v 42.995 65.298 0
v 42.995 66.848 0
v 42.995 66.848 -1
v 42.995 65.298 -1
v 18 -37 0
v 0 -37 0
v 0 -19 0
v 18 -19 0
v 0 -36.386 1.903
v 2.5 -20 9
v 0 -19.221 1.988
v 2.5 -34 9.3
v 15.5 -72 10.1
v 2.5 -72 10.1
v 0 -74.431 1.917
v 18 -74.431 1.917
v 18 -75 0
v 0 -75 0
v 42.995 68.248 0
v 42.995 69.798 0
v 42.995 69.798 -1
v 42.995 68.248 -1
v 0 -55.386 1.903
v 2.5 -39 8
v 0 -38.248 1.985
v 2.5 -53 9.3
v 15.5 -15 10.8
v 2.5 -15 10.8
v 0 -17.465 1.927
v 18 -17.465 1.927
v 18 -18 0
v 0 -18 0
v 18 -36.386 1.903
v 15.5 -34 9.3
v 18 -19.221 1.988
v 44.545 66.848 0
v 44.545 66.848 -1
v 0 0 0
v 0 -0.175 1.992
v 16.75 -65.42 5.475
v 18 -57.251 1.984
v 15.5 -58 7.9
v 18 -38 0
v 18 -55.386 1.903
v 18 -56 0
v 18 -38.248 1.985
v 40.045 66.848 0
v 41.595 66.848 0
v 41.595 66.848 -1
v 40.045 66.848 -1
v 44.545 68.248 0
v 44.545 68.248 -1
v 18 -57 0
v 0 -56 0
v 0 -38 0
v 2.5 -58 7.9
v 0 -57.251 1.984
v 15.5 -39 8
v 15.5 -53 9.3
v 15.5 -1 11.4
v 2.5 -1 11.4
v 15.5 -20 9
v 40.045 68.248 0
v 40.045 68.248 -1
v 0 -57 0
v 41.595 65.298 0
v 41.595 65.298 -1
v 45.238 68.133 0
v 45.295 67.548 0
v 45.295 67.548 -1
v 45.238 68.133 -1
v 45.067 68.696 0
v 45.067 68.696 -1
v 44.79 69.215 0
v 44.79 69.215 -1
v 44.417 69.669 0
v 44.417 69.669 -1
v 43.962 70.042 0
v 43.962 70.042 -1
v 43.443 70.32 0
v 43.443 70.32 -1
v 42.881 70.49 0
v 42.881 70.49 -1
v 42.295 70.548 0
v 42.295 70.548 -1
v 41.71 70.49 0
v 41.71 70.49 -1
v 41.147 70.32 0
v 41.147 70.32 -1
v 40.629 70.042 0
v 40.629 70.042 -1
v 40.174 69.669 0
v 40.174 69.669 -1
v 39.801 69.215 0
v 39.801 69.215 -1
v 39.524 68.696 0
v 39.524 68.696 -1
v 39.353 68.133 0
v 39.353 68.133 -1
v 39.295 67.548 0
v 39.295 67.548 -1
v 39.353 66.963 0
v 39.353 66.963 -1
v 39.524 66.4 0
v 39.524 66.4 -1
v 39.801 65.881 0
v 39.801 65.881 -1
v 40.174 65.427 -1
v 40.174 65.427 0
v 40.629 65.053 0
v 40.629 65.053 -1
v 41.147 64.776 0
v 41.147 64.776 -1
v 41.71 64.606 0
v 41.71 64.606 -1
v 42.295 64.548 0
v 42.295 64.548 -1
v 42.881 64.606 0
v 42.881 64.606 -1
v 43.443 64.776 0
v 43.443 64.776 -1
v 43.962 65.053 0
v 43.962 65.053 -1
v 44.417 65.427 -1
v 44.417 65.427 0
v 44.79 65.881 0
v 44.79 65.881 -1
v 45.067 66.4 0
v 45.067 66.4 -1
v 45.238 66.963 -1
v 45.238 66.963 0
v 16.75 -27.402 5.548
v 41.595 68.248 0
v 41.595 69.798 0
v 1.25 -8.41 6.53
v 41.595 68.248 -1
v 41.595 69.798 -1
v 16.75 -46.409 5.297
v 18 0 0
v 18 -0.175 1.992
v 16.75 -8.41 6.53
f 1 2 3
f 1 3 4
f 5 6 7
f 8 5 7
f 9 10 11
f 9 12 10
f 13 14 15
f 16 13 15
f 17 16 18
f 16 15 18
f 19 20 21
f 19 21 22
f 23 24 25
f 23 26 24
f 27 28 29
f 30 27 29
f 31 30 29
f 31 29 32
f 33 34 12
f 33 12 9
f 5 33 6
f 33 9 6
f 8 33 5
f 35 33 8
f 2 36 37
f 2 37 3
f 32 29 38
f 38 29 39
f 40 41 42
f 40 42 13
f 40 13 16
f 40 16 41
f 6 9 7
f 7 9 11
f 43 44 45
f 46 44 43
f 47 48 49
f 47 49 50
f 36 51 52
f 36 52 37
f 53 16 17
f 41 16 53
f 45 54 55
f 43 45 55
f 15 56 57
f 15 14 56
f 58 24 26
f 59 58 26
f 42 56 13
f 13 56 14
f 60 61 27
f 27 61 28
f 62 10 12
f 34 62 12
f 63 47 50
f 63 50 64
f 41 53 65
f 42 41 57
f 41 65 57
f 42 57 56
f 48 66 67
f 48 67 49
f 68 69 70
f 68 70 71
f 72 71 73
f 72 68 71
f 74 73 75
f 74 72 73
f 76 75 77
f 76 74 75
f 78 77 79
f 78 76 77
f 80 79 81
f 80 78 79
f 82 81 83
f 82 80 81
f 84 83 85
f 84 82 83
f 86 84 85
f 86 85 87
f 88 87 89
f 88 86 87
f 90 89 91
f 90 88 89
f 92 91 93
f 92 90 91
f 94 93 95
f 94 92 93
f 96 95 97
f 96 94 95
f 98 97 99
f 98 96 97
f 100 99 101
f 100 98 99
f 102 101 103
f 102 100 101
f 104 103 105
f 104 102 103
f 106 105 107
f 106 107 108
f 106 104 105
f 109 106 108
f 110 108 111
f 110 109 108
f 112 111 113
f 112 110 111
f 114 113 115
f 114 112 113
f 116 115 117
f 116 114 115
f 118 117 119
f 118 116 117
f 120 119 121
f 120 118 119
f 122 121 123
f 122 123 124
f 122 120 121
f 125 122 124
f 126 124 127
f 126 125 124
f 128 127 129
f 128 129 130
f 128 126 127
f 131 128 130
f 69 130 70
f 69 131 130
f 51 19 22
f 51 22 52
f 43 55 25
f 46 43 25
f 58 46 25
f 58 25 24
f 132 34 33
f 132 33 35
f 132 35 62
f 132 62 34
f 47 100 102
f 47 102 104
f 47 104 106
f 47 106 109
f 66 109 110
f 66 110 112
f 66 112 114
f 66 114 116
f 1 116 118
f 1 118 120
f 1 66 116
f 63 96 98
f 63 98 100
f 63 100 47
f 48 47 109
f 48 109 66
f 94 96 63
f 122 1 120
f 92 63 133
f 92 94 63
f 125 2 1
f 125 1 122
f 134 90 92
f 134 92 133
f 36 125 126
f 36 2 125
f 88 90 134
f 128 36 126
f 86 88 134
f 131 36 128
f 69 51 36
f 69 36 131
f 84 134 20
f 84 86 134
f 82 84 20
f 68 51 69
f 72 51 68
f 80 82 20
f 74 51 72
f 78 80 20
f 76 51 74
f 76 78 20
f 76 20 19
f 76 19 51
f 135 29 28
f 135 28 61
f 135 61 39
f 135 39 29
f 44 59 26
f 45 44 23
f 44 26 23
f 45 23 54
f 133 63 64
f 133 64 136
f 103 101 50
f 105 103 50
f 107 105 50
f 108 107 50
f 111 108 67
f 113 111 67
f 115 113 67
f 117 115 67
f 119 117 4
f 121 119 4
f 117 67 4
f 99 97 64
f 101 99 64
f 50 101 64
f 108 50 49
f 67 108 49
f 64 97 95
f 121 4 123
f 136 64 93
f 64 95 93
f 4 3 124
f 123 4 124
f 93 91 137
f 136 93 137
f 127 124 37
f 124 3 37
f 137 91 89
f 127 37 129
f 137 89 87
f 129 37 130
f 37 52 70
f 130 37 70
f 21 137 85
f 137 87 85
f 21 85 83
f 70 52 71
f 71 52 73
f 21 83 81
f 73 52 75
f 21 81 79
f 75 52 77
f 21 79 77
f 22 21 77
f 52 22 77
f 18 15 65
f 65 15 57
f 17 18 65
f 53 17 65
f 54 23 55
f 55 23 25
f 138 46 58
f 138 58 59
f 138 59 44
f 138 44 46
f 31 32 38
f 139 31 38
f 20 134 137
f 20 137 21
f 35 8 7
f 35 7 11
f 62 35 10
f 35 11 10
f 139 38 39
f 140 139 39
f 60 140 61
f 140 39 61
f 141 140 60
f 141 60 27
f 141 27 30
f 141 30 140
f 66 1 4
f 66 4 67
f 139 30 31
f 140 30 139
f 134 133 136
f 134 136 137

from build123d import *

# Parameters (mm, degrees)
F1_DEPTH  = 18
F18_R     = 3
F19_DEPTH = 1


with BuildPart() as f1:
    # F0 (on Right) → F1 (new body)
    with BuildSketch(Plane.YZ):
        Polygon((-18, 0), (0, 0), (-1, 11.4), (-15, 10.8), align=None)
    extrude(amount=F1_DEPTH)

    # F15 (on face) → F16 section 0
    with BuildSketch(Plane(origin=(0, -16.7106017192, 4.6418338109), x_dir=(1, 0, 0), z_dir=(0, -0.9635179096, 0.2676438638))):
        Polygon((0, -2.8175895481), (2.5, 6.3913354672), (0, 6.3913354672), align=None)
    # F14 (on face) → F16 section 1
    with BuildSketch(Plane(origin=(0, 0, 0), x_dir=(-1, 0, 0), z_dir=(0, 0.9961747239, 0.0873837477))):
        Polygon((0, 11.4437756007), (-2.5, 11.4437756007), (0, 2), align=None)
    loft(mode=Mode.SUBTRACT)

    # F14 (on face) → F17 section 0
    with BuildSketch(Plane(origin=(0, 0, 0), x_dir=(-1, 0, 0), z_dir=(0, 0.9961747239, 0.0873837477))):
        Polygon((-18, 11.4437756007), (-18, 2), (-15.5, 11.4437756007), align=None)
    # F15 (on face) → F17 section 1
    with BuildSketch(Plane(origin=(0, -16.7106017192, 4.6418338109), x_dir=(1, 0, 0), z_dir=(0, -0.9635179096, 0.2676438638))):
        Polygon((15.5, 6.3913354672), (18, -2.8175895481), (18, 6.3913354672), align=None)
    loft(mode=Mode.SUBTRACT)


with BuildPart() as f1b:
    # F0 (on Right) → F1, piece 2 (new body)
    with BuildSketch(Plane.YZ):
        Polygon((-37, 0), (-19, 0), (-20, 9), (-34, 9.3), align=None)
    extrude(amount=F1_DEPTH)

    # F11 (on face) → F12 section 0
    with BuildSketch(Plane(origin=(0, -33.5127238454, 10.8105560792), x_dir=(1, 0, 0), z_dir=(0, -0.9517086178, 0.3070027799))):
        Polygon((15.5, -1.5872043722), (18, -9.3591028571), (18, -1.5872043722), align=None)
    # F10 (on face) → F12 section 1
    with BuildSketch(Plane(origin=(0, -18.7682926829, -2.0853658537), x_dir=(-1, 0, 0), z_dir=(0, 0.9938837347, 0.1104315261))):
        Polygon((-18, 11.1535841336), (-18, 4.0981989954), (-15.5, 11.1535841336), align=None)
    loft(mode=Mode.SUBTRACT)

    # F10 (on face) → F13 section 0
    with BuildSketch(Plane(origin=(0, -18.7682926829, -2.0853658537), x_dir=(-1, 0, 0), z_dir=(0, 0.9938837347, 0.1104315261))):
        Polygon((0, 11.1535841336), (-2.5, 11.1535841336), (0, 4.0981989954), align=None)
    # F11 (on face) → F13 section 1
    with BuildSketch(Plane(origin=(0, -33.5127238454, 10.8105560792), x_dir=(1, 0, 0), z_dir=(0, -0.9517086178, 0.3070027799))):
        Polygon((0, -9.3591028571), (2.5, -1.5872043722), (0, -1.5872043722), align=None)
    loft(mode=Mode.SUBTRACT)


with BuildPart() as f1c:
    # F0 (on Right) → F1, piece 3 (new body)
    with BuildSketch(Plane.YZ):
        Polygon((-56, 0), (-38, 0), (-39, 8), (-53, 9.3), align=None)
    extrude(amount=F1_DEPTH)

    # F2 (on face) → F4 section 0
    with BuildSketch(Plane(origin=(0, -37.4153846154, -4.6769230769), x_dir=(-1, 0, 0), z_dir=(0, 0.9922778767, 0.1240347346))):
        Polygon((-18, 12.7755776627), (-18, 6.7133199144), (-15.5, 12.7755776627), align=None)
    # F3 (on face) → F4 section 1
    with BuildSketch(Plane(origin=(0, -50.7219604147, 16.3619227144), x_dir=(1, 0, 0), z_dir=(0, -0.9517086178, 0.3070027799))):
        Polygon((15.5, -7.4202571907), (18, -15.1921556757), (18, -7.4202571907), align=None)
    loft(mode=Mode.SUBTRACT)

    # F2 (on face) → F5 section 0
    with BuildSketch(Plane(origin=(0, -37.4153846154, -4.6769230769), x_dir=(-1, 0, 0), z_dir=(0, 0.9922778767, 0.1240347346))):
        Polygon((0, 12.7755776627), (-2.5, 12.7755776627), (0, 6.7133199144), align=None)
    # F3 (on face) → F5 section 1
    with BuildSketch(Plane(origin=(0, -50.7219604147, 16.3619227144), x_dir=(1, 0, 0), z_dir=(0, -0.9517086178, 0.3070027799))):
        Polygon((0, -15.1921556757), (2.5, -7.4202571907), (0, -7.4202571907), align=None)
    loft(mode=Mode.SUBTRACT)


with BuildPart() as f1d:
    # F0 (on Right) → F1, piece 4 (new body)
    with BuildSketch(Plane.YZ):
        Polygon((-75, 0), (-57, 0), (-58, 7.9), (-72, 10.1), align=None)
    extrude(amount=F1_DEPTH)

    # F6 (on face) → F8 section 0
    with BuildSketch(Plane(origin=(0, -56.1010881564, -7.1014035641), x_dir=(-1, 0, 0), z_dir=(0, 0.9920834727, 0.1255801864))):
        Polygon((-18, 15.1211102464), (-18, 9.1580706257), (-15.5, 15.1211102464), align=None)
    # F7 (on face) → F8 section 1
    with BuildSketch(Plane(origin=(0, -68.9194667147, 20.4711287271), x_dir=(1, 0, 0), z_dir=(0, -0.9586063962, 0.2847345731))):
        Polygon((18, -10.8189646638), (15.5, -10.8189646638), (18, -19.355092985), align=None)
    loft(mode=Mode.SUBTRACT)

    # F6 (on face) → F9 section 0
    with BuildSketch(Plane(origin=(0, -56.1010881564, -7.1014035641), x_dir=(-1, 0, 0), z_dir=(0, 0.9920834727, 0.1255801864))):
        Polygon((0, 15.1211102464), (-2.5, 15.1211102464), (0, 9.1580706257), align=None)
    # F7 (on face) → F9 section 1
    with BuildSketch(Plane(origin=(0, -68.9194667147, 20.4711287271), x_dir=(1, 0, 0), z_dir=(0, -0.9586063962, 0.2847345731))):
        Polygon((0, -10.8189646638), (0, -19.355092985), (2.5, -10.8189646638), align=None)
    loft(mode=Mode.SUBTRACT)


with BuildPart() as f19:
    # F18 (on Top) → F19 (new body)
    with BuildSketch(Plane.XY):
        with Locations((42.2952837348, 67.5478831649)):
            Circle(F18_R)
        Polygon((40.0452837348, 68.2478831649), (41.5952837348, 68.2478831649), (41.5952837348, 69.7978831649), (42.9952837348, 69.7978831649), (42.9952837348, 68.2478831649), (44.5452837348, 68.2478831649), (44.5452837348, 66.8478831649), (42.9952837348, 66.8478831649), (42.9952837348, 65.2978831649), (41.5952837348, 65.2978831649), (41.5952837348, 66.8478831649), (40.0452837348, 66.8478831649), align=None, mode=Mode.SUBTRACT)
    extrude(amount=-F19_DEPTH)


solid = Compound([f1.part, f1b.part, f1c.part, f1d.part, f19.part])
